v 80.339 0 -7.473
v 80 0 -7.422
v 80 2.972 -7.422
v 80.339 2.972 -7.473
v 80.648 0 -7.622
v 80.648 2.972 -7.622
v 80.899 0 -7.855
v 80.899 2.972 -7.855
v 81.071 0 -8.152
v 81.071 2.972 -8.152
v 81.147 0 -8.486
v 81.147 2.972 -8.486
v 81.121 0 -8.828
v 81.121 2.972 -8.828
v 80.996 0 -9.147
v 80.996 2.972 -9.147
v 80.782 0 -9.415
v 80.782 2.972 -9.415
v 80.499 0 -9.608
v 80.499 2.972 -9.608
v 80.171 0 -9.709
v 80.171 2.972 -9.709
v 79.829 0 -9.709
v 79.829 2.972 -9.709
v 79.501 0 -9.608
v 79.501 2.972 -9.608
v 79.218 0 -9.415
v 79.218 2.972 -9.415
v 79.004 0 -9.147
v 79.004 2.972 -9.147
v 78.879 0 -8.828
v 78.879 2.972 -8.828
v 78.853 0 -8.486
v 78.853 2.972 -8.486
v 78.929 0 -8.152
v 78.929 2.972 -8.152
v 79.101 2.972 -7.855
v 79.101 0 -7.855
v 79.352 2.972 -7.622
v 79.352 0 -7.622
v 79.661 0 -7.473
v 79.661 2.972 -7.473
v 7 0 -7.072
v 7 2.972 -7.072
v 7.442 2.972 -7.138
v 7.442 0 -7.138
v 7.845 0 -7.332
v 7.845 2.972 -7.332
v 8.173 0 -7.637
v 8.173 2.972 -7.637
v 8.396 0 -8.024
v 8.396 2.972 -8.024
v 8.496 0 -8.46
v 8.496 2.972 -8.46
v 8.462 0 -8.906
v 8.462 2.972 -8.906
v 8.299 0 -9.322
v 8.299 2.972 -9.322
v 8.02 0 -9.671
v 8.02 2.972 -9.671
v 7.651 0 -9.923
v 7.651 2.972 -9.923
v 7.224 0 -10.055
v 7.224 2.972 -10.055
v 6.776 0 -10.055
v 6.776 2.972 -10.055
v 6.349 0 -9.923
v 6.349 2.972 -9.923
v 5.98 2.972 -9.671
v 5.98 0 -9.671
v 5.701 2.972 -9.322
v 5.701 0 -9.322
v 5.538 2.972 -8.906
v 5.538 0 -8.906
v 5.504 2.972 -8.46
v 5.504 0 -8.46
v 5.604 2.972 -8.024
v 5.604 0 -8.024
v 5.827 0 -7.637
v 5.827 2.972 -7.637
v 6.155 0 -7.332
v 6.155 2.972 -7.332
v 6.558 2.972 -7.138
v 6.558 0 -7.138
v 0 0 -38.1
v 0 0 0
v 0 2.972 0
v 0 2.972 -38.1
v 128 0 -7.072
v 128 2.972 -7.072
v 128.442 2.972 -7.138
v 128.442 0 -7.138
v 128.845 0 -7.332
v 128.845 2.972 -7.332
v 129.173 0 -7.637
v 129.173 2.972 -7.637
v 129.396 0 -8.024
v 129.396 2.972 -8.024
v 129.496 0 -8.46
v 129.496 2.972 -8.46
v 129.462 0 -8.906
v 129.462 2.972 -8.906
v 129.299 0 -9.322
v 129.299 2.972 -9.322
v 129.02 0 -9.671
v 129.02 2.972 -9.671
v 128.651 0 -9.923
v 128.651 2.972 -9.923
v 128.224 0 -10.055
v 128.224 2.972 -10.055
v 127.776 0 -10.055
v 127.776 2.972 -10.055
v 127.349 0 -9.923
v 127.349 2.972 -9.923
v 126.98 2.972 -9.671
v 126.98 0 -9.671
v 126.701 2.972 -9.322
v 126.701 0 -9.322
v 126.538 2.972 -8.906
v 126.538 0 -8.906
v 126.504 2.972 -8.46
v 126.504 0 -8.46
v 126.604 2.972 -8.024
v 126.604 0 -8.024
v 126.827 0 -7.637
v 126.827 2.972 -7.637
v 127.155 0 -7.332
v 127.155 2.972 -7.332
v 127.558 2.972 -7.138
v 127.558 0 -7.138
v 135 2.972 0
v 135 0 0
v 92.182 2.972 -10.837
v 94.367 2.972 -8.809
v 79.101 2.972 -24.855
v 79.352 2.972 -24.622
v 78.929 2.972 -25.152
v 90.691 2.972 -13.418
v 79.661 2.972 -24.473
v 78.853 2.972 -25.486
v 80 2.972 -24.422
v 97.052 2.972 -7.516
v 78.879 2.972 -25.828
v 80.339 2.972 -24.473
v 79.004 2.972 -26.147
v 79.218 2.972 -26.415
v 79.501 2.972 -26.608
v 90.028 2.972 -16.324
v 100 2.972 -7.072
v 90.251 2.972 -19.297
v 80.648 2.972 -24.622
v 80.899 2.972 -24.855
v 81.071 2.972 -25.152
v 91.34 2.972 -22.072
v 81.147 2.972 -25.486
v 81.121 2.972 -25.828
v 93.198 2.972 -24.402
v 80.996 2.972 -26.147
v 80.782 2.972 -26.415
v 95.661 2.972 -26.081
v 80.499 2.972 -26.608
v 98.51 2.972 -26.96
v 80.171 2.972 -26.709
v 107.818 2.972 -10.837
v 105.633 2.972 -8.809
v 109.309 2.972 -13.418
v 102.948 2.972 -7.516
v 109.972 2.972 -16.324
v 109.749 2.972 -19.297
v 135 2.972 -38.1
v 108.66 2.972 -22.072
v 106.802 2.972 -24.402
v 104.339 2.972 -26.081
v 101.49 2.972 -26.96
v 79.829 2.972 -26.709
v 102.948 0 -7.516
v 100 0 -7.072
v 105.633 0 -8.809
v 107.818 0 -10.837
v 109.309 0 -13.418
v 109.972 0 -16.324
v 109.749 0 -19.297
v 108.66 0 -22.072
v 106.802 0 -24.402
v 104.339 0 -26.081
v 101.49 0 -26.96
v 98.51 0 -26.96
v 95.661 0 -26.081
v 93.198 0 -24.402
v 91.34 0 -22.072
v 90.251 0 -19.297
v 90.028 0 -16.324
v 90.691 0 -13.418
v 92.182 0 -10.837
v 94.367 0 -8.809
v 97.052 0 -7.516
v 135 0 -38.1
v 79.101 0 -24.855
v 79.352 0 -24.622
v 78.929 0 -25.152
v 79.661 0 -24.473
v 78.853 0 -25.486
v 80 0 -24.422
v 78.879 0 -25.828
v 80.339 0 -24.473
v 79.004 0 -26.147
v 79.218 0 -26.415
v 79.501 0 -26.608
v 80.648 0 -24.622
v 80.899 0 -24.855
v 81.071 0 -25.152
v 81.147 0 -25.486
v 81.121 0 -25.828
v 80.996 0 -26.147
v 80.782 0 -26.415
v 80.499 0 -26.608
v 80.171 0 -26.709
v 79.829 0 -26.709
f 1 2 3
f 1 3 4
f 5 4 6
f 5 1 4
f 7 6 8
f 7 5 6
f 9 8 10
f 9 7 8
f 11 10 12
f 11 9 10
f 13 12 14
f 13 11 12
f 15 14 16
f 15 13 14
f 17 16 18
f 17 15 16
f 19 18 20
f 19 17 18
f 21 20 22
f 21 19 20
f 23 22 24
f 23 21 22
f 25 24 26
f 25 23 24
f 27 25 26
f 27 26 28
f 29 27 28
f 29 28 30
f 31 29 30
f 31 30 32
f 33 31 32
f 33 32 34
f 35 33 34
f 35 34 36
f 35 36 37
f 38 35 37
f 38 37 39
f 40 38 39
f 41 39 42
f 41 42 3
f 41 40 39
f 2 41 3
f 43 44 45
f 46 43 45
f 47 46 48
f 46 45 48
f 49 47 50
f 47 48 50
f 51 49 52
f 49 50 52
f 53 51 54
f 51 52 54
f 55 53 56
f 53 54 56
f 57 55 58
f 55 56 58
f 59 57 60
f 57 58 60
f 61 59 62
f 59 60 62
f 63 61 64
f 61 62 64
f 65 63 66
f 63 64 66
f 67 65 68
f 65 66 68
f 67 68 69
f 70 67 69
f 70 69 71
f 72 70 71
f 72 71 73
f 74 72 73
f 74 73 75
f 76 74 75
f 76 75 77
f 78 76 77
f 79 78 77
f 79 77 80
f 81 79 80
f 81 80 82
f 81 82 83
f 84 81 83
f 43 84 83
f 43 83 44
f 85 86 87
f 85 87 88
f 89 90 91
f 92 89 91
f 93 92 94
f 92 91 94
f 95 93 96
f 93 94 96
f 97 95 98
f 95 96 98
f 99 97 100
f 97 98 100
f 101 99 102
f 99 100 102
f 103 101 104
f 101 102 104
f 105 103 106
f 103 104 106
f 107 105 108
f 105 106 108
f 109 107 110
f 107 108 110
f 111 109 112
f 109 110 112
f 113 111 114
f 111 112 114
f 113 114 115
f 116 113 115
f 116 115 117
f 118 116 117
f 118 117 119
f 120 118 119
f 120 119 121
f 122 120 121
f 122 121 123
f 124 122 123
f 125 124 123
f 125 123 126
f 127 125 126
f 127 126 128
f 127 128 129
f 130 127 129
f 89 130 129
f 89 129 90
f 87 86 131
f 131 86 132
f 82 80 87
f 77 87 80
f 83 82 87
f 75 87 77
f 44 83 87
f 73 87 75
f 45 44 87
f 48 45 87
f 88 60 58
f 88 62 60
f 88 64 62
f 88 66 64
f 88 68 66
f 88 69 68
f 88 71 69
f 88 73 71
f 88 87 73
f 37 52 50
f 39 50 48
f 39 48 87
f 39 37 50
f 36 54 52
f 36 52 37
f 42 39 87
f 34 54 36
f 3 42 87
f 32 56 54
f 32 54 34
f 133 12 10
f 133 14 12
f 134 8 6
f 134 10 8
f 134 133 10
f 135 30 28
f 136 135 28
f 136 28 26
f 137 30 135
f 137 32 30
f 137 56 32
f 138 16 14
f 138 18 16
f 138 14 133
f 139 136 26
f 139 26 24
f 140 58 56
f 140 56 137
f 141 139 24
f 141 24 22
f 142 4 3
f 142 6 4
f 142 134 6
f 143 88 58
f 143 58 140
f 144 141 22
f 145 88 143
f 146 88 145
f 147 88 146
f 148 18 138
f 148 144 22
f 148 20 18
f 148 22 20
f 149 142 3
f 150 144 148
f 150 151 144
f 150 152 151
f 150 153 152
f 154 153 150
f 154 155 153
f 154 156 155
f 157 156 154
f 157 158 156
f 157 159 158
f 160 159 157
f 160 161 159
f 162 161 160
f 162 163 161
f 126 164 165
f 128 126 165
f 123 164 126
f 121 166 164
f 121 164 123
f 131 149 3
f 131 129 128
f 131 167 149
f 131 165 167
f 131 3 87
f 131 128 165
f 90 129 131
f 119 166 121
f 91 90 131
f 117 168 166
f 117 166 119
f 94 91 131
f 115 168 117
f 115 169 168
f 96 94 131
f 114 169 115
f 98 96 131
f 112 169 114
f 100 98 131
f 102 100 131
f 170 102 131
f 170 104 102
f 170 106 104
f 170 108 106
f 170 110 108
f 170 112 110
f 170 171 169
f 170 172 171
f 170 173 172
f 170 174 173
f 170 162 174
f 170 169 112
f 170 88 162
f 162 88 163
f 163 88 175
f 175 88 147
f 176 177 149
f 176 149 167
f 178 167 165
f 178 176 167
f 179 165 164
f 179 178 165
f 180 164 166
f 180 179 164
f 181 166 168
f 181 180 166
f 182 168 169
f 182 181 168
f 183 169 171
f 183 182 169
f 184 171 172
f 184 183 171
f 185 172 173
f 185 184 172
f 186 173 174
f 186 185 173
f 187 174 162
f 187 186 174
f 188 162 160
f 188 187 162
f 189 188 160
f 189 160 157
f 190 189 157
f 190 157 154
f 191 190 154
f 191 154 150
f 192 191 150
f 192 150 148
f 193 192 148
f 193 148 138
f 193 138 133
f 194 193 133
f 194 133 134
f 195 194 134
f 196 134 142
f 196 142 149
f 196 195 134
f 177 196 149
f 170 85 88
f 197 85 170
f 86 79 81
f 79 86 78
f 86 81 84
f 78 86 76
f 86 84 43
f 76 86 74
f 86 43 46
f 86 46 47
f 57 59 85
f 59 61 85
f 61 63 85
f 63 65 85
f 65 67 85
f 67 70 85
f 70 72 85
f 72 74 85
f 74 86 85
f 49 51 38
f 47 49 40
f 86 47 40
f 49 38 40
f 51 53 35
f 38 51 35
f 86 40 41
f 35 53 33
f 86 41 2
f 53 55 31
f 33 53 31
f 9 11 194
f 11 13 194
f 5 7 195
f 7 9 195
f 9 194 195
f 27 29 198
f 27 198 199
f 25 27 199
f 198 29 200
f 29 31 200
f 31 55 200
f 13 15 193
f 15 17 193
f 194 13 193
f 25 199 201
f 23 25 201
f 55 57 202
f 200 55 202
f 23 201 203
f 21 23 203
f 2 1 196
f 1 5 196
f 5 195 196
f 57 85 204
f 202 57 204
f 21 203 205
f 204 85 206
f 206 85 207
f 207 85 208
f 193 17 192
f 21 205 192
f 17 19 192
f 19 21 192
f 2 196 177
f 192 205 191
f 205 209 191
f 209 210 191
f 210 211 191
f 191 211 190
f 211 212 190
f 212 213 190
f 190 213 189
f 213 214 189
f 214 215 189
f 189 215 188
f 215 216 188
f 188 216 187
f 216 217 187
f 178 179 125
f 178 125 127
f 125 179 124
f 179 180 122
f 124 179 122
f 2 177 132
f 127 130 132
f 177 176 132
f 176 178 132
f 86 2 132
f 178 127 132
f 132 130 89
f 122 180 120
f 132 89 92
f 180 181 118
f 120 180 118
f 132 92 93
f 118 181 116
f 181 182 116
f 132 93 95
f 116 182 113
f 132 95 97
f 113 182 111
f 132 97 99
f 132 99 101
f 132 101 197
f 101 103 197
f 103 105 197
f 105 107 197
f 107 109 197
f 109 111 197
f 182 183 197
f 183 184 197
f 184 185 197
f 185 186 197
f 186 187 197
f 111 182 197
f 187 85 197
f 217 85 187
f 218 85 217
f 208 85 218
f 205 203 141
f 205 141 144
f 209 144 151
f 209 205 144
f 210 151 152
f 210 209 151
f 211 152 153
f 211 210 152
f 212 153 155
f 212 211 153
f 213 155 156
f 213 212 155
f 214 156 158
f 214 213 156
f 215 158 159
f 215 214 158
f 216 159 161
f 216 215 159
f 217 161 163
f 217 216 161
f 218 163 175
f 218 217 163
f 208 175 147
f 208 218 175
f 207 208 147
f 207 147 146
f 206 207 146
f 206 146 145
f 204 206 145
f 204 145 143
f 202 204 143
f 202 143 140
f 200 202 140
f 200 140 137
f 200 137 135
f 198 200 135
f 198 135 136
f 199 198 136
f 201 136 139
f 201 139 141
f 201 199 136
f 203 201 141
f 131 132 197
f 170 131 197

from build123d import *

# Parameters (mm, degrees)
SKETCH1_W           = 135
SKETCH1_H           = 38.1
SKETCH1_R           = 1.15
SKETCH1_R_2         = 10
BOSS_EXTRUDE1_DEPTH = 2.9718
SKETCH2_R           = 1.5
CUT_EXTRUDE1_DEPTH  = 141.304816721


with BuildPart() as part:
    # Sketch1 → Boss-Extrude1 (new body)
    with BuildSketch(Plane(origin=(0, 0, 0), x_dir=(1, 0, 0), z_dir=(0, 1, 0))):
        with Locations((67.5, 19.05)):
            Rectangle(SKETCH1_W, SKETCH1_H)
        with Locations(Location((80, 8.5718, 0), (0, 0, 270))):
            Circle(SKETCH1_R, mode=Mode.SUBTRACT)
        with Locations(Location((80, 25.5718, 0), (0, 0, 270))):
            Circle(SKETCH1_R, mode=Mode.SUBTRACT)
        with Locations(Location((100, 17.0718, 0), (0, 0, 270))):
            Circle(SKETCH1_R_2, mode=Mode.SUBTRACT)
    extrude(amount=BOSS_EXTRUDE1_DEPTH)

    # Sketch2 → Cut-Extrude1 (cut, through all)
    with BuildSketch(Plane(origin=(0, 2.9718, 0), x_dir=(1, 0, 0), z_dir=(0, 1, 0))):
        with Locations(Location((128, 8.5718, 0), (0, 0, 270))):
            Circle(SKETCH2_R)
        with Locations(Location((7, 8.5718, 0), (0, 0, 270))):
            Circle(SKETCH2_R)
    extrude(amount=-CUT_EXTRUDE1_DEPTH, mode=Mode.SUBTRACT)


solid = part.part
